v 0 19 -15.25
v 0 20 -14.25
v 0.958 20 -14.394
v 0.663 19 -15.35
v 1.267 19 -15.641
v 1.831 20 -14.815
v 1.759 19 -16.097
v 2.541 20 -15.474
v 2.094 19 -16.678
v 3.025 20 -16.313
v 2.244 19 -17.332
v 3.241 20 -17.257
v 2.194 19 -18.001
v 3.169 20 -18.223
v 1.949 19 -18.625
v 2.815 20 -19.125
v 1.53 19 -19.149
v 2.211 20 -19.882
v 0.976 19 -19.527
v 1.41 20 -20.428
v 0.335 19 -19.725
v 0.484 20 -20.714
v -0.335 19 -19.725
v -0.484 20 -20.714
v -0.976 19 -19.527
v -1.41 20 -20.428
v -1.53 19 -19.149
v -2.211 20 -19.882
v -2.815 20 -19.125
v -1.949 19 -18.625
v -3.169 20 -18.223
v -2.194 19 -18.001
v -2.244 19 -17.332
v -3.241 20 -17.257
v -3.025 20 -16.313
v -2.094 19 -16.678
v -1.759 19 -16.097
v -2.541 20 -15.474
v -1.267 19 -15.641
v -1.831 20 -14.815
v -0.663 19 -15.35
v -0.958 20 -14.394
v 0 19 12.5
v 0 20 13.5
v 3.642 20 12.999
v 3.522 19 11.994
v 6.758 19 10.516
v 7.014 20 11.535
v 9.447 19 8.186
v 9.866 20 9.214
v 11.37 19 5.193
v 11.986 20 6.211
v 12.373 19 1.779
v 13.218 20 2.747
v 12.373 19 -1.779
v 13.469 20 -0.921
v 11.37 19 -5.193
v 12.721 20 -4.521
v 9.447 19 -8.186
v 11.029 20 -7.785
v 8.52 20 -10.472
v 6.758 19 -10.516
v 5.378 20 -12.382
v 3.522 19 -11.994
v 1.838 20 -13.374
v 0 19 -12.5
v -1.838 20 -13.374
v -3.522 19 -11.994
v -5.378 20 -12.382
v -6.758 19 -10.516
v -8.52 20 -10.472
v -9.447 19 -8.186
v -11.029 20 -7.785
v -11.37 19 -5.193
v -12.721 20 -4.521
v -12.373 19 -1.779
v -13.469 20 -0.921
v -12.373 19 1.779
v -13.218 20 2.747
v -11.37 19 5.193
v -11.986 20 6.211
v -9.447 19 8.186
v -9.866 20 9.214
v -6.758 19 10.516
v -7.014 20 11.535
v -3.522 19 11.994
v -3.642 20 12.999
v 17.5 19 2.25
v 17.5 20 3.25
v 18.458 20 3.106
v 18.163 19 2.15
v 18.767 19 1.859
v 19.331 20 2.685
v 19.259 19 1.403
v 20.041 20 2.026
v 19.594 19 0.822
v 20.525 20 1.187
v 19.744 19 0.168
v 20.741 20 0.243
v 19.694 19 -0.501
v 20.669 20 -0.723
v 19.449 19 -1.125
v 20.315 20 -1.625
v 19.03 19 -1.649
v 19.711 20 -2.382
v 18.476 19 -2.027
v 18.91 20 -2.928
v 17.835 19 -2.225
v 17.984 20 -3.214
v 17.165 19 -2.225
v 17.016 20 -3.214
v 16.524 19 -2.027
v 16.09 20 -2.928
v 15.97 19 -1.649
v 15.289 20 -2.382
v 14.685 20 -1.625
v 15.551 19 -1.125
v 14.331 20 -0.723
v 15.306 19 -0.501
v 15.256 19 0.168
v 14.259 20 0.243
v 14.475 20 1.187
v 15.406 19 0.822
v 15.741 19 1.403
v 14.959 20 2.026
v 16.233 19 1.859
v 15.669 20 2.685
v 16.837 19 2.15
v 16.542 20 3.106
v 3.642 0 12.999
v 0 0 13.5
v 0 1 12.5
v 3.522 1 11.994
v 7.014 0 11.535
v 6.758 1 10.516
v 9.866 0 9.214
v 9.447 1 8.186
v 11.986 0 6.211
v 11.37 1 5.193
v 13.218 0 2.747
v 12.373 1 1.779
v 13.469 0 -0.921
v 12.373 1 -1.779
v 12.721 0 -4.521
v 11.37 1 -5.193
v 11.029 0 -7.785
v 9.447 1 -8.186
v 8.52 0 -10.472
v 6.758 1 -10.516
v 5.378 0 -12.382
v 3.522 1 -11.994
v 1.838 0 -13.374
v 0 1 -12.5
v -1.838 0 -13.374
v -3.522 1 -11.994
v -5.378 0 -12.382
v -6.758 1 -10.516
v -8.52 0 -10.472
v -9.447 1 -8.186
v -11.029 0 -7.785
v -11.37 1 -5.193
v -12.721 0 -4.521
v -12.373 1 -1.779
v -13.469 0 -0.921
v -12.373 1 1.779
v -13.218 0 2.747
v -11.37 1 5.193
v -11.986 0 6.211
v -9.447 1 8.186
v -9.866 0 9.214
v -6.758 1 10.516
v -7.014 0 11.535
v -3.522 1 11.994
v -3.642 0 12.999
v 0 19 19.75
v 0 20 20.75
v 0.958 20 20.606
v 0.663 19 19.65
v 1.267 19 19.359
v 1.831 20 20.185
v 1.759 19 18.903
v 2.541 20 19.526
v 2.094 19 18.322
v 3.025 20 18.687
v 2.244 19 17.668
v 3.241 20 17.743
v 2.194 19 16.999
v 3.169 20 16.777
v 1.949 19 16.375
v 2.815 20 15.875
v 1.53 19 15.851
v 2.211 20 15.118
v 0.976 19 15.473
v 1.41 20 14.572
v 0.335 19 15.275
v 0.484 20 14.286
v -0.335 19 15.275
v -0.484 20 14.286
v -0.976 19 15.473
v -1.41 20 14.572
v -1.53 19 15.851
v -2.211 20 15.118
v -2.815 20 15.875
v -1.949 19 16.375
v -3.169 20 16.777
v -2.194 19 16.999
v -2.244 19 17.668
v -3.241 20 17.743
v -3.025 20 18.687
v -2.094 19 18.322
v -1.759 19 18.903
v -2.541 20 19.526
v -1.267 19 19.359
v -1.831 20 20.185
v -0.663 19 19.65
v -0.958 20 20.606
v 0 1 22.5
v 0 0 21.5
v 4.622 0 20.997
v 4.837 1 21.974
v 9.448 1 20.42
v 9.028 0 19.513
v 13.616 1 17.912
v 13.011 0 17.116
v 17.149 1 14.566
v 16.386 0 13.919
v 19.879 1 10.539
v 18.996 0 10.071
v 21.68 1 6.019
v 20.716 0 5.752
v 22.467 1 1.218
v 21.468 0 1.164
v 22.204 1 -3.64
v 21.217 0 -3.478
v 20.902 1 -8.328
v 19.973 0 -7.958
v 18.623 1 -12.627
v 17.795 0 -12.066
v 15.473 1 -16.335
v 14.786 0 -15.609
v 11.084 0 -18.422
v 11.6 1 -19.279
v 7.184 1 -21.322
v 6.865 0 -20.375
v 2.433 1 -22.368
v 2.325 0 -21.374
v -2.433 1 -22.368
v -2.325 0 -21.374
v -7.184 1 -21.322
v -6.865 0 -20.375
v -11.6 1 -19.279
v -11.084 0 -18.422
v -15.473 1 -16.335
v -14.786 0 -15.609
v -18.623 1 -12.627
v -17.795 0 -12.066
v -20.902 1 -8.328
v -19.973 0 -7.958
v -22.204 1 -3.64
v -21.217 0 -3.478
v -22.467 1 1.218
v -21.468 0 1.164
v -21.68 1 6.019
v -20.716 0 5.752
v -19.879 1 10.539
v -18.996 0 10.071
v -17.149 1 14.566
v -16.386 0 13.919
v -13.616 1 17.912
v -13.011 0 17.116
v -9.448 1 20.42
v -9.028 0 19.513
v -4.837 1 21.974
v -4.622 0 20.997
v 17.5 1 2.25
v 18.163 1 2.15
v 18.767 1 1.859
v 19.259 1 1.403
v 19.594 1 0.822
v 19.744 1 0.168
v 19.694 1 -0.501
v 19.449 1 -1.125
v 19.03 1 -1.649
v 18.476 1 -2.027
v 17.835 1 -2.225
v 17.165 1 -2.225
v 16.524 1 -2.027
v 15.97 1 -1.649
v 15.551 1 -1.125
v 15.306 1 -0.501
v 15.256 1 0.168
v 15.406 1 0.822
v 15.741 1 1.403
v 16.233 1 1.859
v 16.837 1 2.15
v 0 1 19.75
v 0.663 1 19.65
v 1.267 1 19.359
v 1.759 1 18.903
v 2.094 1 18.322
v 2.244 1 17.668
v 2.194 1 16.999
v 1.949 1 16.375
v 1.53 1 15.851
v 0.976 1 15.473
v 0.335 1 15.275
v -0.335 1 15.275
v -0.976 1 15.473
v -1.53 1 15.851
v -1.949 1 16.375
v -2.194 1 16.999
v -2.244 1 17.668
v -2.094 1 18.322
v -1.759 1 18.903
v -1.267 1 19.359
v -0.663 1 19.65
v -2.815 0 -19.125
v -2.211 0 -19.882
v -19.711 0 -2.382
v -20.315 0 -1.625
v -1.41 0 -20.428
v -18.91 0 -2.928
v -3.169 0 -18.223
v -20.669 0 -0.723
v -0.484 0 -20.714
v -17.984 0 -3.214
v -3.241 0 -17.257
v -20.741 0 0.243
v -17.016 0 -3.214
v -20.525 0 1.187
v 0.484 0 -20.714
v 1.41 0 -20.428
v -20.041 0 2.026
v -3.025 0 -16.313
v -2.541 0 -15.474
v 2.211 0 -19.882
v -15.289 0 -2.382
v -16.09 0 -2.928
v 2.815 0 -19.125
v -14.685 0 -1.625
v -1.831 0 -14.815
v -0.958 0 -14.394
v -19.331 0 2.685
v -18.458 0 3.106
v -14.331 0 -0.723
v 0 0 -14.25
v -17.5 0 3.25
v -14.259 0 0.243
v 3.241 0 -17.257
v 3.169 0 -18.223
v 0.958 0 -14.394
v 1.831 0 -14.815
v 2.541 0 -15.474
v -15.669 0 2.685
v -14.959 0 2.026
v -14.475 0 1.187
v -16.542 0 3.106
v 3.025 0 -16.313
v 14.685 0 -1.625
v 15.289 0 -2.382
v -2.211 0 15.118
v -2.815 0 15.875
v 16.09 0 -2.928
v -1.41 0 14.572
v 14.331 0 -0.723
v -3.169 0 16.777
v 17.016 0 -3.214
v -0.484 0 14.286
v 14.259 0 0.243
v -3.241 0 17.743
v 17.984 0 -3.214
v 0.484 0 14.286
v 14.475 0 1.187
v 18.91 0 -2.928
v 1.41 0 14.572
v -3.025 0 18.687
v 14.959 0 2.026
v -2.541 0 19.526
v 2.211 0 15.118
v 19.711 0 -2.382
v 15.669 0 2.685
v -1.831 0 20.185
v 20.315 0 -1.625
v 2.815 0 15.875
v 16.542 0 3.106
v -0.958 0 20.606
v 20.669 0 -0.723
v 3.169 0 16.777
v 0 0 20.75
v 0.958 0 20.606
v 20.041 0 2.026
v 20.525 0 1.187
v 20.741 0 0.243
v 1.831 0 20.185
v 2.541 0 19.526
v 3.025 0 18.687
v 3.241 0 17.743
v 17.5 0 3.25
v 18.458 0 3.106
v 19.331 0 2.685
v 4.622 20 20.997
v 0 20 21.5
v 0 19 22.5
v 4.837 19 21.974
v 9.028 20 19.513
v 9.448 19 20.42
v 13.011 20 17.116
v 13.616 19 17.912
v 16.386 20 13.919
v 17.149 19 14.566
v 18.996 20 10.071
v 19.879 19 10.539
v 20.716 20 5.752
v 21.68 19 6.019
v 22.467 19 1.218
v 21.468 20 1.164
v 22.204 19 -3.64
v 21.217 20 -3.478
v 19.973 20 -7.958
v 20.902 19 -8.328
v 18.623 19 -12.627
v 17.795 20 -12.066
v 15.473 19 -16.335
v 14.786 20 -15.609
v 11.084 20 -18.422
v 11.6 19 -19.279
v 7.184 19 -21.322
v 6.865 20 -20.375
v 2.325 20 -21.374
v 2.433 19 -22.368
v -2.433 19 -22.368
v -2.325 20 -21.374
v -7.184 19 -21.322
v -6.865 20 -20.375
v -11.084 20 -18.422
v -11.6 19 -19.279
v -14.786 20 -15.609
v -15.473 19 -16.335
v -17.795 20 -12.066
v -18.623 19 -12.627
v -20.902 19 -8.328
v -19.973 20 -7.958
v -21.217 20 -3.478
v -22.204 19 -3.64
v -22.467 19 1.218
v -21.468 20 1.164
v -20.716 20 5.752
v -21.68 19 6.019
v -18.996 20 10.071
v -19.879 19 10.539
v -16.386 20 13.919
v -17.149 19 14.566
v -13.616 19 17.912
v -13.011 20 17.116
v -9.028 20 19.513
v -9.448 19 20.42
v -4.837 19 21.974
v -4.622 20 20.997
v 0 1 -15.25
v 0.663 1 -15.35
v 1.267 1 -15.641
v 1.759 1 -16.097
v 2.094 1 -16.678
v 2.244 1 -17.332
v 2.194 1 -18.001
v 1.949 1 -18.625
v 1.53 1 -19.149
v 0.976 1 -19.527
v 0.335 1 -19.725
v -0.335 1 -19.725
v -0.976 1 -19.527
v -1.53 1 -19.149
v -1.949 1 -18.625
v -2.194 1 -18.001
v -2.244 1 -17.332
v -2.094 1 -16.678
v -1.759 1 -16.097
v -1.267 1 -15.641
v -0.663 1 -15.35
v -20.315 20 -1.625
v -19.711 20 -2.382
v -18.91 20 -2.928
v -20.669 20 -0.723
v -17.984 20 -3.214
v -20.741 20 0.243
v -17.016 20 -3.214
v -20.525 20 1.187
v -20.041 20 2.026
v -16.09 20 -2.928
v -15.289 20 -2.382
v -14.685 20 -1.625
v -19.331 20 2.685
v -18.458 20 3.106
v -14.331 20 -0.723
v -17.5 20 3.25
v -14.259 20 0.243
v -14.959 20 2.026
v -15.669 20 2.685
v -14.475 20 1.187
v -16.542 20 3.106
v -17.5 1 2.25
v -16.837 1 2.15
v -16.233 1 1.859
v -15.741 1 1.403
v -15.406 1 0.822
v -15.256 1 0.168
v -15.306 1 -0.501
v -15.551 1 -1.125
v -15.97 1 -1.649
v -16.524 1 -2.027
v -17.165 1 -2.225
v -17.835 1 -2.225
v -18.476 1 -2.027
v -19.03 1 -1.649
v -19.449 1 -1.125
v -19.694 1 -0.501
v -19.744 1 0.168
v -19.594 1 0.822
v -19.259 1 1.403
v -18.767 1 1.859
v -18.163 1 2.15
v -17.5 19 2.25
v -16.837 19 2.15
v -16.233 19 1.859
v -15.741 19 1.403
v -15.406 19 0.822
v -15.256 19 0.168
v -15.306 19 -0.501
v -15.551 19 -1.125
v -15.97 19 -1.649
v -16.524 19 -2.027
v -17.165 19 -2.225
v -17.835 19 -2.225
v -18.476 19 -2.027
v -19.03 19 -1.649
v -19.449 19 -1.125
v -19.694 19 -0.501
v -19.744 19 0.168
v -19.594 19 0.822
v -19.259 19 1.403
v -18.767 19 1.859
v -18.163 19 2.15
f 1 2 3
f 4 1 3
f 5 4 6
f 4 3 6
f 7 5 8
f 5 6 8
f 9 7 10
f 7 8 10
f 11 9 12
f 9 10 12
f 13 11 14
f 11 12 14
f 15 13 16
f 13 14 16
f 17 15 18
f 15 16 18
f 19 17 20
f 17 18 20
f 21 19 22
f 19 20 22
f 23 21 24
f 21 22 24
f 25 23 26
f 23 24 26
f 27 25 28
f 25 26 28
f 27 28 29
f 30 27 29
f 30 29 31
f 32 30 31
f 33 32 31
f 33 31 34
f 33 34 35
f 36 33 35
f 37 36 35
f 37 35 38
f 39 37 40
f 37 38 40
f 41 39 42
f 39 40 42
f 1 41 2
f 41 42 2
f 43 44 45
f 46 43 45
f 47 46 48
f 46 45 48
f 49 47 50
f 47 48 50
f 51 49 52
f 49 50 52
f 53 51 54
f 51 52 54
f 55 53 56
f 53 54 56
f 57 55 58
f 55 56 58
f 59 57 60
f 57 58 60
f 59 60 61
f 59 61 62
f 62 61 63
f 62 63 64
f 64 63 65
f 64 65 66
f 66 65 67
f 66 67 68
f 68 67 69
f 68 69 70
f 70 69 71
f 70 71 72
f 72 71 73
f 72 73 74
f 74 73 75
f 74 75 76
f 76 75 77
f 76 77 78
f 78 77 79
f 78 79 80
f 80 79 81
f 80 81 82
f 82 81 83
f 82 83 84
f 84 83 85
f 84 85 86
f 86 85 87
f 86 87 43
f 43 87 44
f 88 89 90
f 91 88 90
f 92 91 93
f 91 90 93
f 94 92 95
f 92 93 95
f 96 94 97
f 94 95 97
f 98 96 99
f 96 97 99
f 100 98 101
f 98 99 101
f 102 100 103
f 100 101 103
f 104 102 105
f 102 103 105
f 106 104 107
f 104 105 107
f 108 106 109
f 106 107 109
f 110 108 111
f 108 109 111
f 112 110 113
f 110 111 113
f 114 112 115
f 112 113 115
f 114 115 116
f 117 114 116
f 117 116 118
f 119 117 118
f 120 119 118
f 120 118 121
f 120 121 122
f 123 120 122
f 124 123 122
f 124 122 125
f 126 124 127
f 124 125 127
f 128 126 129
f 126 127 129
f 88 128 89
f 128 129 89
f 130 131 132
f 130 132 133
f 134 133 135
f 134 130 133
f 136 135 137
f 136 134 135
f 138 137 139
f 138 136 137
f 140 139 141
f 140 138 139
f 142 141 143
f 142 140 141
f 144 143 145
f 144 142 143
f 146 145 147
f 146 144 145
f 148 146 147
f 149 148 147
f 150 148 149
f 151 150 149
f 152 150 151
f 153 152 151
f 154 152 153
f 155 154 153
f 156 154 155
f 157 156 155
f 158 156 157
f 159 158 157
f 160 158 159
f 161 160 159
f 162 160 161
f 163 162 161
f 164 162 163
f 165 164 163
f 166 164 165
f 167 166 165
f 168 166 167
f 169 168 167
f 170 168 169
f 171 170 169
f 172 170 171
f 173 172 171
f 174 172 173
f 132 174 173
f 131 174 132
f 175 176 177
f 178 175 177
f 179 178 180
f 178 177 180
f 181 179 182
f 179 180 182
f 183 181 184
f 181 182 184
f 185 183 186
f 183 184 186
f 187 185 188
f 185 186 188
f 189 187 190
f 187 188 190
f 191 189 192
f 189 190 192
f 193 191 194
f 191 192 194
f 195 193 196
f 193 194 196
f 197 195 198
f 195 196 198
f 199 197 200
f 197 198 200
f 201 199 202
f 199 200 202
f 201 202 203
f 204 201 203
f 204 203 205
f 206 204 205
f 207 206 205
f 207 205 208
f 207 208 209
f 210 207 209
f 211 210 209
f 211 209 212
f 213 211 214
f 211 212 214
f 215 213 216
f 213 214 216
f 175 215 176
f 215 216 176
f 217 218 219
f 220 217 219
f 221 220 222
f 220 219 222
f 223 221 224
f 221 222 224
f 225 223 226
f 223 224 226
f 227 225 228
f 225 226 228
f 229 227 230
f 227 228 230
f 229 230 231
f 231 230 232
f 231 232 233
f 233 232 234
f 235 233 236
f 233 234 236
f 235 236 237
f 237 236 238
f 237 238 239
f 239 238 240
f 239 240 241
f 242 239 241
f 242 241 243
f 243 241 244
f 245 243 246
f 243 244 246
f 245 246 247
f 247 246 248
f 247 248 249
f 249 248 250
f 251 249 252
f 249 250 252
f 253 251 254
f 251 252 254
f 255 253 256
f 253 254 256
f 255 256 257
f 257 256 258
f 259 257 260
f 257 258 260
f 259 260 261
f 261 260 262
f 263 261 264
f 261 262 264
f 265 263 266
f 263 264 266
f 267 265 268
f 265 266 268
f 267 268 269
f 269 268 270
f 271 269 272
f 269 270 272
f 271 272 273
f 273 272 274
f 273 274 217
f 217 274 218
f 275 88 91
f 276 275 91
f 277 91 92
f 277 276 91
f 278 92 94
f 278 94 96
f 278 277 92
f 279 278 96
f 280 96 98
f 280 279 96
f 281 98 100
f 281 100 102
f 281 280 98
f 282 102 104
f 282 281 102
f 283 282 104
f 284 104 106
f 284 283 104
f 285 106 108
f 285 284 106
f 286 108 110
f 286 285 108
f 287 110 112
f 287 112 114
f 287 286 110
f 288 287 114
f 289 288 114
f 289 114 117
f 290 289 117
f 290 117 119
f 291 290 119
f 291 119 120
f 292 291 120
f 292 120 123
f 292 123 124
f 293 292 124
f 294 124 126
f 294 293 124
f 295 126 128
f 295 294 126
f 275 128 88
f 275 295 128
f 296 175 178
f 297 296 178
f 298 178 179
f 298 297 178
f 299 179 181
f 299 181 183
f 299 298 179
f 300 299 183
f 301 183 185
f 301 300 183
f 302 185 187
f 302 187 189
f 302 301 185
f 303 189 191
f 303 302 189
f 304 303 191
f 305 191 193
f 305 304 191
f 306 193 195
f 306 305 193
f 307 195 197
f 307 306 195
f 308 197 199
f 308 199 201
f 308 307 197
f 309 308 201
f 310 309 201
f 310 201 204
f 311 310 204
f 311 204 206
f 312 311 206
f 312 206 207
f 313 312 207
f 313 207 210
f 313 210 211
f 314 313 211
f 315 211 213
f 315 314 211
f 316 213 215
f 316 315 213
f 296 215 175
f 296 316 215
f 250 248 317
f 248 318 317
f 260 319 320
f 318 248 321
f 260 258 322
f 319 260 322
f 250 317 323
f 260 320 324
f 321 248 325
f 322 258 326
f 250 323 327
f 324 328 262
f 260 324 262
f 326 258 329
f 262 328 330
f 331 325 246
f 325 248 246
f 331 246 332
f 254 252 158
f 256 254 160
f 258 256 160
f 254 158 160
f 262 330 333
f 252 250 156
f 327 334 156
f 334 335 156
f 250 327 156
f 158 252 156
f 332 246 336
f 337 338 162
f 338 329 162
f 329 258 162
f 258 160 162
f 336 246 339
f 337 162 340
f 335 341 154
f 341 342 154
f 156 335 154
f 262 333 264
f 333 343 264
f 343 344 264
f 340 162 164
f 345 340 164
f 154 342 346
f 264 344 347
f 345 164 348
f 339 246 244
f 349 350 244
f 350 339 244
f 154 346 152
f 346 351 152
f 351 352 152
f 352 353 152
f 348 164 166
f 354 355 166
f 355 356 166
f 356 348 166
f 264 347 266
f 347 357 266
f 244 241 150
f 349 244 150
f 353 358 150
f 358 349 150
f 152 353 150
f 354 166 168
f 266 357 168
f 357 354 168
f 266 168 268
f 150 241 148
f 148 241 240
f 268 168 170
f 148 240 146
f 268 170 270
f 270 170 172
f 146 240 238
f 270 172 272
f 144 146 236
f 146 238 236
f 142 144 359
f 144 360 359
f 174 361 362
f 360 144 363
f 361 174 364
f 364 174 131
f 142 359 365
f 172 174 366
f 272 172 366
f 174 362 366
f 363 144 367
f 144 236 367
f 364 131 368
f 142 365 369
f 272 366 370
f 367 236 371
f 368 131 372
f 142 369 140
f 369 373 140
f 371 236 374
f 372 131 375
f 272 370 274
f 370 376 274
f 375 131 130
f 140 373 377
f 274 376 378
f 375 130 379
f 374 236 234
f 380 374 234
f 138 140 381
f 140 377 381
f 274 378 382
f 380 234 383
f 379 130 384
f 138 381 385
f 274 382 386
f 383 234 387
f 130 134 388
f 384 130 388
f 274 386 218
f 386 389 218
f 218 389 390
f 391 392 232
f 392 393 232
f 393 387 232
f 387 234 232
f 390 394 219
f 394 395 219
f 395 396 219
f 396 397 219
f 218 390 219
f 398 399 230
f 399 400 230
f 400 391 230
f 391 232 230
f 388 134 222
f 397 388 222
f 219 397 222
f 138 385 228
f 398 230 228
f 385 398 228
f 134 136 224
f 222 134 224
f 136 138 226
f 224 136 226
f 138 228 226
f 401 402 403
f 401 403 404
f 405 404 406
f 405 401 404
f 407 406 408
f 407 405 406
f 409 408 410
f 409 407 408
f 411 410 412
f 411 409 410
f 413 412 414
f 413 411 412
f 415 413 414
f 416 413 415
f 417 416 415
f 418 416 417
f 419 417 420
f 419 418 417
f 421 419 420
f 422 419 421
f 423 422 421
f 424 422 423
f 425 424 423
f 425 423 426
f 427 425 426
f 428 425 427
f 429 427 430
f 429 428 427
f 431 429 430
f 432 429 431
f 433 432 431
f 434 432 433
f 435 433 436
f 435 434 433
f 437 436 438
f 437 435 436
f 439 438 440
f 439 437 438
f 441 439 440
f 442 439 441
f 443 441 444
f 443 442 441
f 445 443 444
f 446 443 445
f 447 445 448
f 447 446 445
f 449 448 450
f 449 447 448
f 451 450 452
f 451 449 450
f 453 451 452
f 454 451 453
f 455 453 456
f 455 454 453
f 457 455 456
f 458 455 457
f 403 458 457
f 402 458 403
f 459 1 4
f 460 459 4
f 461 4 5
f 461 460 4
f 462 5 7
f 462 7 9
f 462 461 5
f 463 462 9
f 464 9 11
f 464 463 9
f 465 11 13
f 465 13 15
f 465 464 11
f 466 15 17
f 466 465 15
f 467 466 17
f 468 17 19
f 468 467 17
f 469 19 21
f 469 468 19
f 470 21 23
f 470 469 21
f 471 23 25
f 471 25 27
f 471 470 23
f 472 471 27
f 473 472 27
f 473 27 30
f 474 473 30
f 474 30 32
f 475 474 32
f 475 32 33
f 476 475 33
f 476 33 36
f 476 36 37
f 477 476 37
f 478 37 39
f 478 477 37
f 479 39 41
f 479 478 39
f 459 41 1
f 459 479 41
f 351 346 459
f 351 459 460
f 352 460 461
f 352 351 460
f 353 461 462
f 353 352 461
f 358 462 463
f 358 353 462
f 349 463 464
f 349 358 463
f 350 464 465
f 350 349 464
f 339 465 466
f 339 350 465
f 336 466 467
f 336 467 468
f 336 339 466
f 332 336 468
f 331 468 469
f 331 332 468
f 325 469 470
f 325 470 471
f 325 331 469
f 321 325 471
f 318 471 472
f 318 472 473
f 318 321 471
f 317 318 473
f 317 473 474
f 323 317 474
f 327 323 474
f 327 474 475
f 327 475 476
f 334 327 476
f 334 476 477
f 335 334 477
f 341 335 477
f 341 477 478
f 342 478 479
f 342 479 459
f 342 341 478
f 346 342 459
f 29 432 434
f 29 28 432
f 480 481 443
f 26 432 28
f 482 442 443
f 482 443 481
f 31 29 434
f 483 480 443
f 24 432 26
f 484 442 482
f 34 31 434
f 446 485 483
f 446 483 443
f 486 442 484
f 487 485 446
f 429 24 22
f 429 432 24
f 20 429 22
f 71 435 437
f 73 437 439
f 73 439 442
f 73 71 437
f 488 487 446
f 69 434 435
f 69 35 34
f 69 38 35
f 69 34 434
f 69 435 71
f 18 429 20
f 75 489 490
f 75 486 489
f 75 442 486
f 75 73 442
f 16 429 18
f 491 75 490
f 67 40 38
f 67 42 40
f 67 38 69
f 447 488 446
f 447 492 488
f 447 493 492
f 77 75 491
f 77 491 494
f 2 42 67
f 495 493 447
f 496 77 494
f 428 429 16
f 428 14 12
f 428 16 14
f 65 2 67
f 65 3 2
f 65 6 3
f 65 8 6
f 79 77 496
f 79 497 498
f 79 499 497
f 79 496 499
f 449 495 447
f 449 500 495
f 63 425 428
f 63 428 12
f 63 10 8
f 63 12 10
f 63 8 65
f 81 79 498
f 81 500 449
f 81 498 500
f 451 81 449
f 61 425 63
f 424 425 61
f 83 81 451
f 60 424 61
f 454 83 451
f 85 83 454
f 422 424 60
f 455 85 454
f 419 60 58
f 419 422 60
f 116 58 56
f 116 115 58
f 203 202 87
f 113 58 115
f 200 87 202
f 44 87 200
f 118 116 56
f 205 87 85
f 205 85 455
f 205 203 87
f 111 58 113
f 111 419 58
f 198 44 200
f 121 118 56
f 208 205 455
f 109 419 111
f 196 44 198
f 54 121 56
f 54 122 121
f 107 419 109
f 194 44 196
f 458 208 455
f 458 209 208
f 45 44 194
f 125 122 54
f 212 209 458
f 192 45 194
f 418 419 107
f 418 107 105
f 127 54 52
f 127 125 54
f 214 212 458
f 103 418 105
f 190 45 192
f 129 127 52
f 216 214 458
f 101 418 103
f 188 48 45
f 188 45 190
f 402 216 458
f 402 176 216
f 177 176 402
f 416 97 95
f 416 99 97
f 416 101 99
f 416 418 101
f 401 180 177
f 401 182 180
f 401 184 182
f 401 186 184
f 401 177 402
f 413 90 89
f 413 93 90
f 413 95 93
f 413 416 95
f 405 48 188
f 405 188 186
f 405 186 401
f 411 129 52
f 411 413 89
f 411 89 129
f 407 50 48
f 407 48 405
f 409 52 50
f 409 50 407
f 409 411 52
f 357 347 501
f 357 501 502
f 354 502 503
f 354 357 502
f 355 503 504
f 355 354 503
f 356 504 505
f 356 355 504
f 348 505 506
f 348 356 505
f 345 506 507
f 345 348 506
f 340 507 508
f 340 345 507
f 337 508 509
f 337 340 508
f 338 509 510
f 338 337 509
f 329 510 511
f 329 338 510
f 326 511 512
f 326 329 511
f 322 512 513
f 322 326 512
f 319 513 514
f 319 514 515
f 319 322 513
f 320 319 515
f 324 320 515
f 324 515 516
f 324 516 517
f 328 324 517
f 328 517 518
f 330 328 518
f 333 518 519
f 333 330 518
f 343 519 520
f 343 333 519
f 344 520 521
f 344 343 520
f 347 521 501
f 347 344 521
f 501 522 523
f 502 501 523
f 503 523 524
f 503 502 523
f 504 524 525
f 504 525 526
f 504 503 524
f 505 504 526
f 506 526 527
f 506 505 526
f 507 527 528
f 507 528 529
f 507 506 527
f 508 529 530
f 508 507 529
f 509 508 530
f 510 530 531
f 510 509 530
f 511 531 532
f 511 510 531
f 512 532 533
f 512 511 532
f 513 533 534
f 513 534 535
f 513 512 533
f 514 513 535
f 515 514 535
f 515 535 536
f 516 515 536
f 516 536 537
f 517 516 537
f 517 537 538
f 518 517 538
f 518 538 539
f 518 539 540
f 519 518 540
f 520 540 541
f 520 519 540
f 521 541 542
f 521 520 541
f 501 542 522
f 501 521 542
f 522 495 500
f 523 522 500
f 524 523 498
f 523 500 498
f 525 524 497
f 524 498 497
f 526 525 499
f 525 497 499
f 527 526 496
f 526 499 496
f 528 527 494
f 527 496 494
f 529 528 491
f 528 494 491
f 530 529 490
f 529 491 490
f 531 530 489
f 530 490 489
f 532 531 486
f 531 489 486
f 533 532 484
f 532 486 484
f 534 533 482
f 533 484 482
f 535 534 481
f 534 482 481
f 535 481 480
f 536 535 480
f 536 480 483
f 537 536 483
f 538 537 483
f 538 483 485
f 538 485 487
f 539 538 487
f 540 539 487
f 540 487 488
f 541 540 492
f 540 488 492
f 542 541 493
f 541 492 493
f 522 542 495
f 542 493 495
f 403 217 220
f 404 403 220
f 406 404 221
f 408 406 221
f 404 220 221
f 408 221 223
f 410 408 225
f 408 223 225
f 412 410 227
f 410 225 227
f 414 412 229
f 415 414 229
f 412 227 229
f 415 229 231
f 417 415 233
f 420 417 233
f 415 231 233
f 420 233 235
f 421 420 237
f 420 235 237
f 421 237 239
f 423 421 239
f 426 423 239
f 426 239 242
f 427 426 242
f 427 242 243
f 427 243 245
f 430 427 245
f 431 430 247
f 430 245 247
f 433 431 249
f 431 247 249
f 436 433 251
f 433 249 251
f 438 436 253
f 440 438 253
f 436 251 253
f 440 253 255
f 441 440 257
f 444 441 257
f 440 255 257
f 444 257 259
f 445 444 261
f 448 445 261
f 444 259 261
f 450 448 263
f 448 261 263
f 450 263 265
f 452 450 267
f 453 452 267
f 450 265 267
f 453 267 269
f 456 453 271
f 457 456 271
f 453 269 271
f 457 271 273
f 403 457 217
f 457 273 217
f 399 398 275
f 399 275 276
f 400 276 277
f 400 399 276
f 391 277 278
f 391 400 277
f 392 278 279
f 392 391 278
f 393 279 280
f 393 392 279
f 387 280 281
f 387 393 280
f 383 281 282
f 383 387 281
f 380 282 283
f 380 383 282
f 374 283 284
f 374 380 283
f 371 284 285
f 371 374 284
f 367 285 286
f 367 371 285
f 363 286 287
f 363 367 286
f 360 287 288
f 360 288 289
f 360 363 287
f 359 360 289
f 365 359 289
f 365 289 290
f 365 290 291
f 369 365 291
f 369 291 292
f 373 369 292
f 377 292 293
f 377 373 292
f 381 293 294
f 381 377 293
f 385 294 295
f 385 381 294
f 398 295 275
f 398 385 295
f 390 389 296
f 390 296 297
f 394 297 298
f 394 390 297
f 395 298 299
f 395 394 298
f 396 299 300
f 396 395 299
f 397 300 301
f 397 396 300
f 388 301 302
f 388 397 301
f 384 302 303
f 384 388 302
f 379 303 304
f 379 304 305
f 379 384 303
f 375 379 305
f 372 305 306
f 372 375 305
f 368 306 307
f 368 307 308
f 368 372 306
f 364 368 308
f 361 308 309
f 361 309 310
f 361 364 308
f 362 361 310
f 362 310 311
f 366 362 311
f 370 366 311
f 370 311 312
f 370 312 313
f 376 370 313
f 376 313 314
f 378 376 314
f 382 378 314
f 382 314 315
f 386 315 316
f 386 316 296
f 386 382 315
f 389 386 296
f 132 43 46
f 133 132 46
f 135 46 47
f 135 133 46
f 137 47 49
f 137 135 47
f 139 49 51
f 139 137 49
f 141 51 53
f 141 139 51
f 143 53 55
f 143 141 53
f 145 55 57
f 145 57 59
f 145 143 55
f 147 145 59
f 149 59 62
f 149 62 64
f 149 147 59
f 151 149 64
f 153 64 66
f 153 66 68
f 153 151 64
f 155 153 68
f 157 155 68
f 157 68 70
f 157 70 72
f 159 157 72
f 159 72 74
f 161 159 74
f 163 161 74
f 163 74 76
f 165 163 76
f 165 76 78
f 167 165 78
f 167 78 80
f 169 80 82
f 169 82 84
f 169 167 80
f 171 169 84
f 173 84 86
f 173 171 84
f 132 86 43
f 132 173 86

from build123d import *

# Parameters (mm, degrees)
SKETCH1_R           = 22.5
SKETCH1_R_2         = 2.25
SKETCH1_R_3         = 12.5
BOSS_EXTRUDE1_DEPTH = 20
CHAMFER1_SIZE       = 1


with BuildPart() as part:
    # Sketch1 → Boss-Extrude1 (new body)
    with BuildSketch(Plane(origin=(0, 0, 0), x_dir=(1, 0, 0), z_dir=(0, 1, 0))):
        with Locations(Location((0, 0, 0), (0, 0, 270))):
            Circle(SKETCH1_R)
        with Locations(Location((-17.5, 0, 0), (0, 0, 270))):
            Circle(SKETCH1_R_2, mode=Mode.SUBTRACT)
        with Locations(Location((0, 17.5, 0), (0, 0, 270))):
            Circle(SKETCH1_R_2, mode=Mode.SUBTRACT)
        with Locations(Location((17.5, 0, 0), (0, 0, 270))):
            Circle(SKETCH1_R_2, mode=Mode.SUBTRACT)
        with Locations(Location((0, -17.5, 0), (0, 0, 270))):
            Circle(SKETCH1_R_2, mode=Mode.SUBTRACT)
        with Locations(Location((0, 0, 0), (0, 0, 270))):
            Circle(SKETCH1_R_3, mode=Mode.SUBTRACT)
    extrude(amount=BOSS_EXTRUDE1_DEPTH)

    # Chamfer1
    chamfer1_edges = [part.edges().sort_by_distance(p)[0] for p in [
        (0, 0, -19.75),
        (0, 20, -19.75),
        (17.5, 0, -2.25),
        (17.5, 20, -2.25),
        (0, 0, -22.5),
        (0, 0, 15.25),
        (0, 20, 15.25),
        (0, 20, -22.5),
        (-17.5, 0, -2.25),
        (-17.5, 20, -2.25),
        (0, 0, -12.5),
        (0, 20, -12.5),
    ]]
    chamfer(chamfer1_edges, length=CHAMFER1_SIZE)


solid = part.part
